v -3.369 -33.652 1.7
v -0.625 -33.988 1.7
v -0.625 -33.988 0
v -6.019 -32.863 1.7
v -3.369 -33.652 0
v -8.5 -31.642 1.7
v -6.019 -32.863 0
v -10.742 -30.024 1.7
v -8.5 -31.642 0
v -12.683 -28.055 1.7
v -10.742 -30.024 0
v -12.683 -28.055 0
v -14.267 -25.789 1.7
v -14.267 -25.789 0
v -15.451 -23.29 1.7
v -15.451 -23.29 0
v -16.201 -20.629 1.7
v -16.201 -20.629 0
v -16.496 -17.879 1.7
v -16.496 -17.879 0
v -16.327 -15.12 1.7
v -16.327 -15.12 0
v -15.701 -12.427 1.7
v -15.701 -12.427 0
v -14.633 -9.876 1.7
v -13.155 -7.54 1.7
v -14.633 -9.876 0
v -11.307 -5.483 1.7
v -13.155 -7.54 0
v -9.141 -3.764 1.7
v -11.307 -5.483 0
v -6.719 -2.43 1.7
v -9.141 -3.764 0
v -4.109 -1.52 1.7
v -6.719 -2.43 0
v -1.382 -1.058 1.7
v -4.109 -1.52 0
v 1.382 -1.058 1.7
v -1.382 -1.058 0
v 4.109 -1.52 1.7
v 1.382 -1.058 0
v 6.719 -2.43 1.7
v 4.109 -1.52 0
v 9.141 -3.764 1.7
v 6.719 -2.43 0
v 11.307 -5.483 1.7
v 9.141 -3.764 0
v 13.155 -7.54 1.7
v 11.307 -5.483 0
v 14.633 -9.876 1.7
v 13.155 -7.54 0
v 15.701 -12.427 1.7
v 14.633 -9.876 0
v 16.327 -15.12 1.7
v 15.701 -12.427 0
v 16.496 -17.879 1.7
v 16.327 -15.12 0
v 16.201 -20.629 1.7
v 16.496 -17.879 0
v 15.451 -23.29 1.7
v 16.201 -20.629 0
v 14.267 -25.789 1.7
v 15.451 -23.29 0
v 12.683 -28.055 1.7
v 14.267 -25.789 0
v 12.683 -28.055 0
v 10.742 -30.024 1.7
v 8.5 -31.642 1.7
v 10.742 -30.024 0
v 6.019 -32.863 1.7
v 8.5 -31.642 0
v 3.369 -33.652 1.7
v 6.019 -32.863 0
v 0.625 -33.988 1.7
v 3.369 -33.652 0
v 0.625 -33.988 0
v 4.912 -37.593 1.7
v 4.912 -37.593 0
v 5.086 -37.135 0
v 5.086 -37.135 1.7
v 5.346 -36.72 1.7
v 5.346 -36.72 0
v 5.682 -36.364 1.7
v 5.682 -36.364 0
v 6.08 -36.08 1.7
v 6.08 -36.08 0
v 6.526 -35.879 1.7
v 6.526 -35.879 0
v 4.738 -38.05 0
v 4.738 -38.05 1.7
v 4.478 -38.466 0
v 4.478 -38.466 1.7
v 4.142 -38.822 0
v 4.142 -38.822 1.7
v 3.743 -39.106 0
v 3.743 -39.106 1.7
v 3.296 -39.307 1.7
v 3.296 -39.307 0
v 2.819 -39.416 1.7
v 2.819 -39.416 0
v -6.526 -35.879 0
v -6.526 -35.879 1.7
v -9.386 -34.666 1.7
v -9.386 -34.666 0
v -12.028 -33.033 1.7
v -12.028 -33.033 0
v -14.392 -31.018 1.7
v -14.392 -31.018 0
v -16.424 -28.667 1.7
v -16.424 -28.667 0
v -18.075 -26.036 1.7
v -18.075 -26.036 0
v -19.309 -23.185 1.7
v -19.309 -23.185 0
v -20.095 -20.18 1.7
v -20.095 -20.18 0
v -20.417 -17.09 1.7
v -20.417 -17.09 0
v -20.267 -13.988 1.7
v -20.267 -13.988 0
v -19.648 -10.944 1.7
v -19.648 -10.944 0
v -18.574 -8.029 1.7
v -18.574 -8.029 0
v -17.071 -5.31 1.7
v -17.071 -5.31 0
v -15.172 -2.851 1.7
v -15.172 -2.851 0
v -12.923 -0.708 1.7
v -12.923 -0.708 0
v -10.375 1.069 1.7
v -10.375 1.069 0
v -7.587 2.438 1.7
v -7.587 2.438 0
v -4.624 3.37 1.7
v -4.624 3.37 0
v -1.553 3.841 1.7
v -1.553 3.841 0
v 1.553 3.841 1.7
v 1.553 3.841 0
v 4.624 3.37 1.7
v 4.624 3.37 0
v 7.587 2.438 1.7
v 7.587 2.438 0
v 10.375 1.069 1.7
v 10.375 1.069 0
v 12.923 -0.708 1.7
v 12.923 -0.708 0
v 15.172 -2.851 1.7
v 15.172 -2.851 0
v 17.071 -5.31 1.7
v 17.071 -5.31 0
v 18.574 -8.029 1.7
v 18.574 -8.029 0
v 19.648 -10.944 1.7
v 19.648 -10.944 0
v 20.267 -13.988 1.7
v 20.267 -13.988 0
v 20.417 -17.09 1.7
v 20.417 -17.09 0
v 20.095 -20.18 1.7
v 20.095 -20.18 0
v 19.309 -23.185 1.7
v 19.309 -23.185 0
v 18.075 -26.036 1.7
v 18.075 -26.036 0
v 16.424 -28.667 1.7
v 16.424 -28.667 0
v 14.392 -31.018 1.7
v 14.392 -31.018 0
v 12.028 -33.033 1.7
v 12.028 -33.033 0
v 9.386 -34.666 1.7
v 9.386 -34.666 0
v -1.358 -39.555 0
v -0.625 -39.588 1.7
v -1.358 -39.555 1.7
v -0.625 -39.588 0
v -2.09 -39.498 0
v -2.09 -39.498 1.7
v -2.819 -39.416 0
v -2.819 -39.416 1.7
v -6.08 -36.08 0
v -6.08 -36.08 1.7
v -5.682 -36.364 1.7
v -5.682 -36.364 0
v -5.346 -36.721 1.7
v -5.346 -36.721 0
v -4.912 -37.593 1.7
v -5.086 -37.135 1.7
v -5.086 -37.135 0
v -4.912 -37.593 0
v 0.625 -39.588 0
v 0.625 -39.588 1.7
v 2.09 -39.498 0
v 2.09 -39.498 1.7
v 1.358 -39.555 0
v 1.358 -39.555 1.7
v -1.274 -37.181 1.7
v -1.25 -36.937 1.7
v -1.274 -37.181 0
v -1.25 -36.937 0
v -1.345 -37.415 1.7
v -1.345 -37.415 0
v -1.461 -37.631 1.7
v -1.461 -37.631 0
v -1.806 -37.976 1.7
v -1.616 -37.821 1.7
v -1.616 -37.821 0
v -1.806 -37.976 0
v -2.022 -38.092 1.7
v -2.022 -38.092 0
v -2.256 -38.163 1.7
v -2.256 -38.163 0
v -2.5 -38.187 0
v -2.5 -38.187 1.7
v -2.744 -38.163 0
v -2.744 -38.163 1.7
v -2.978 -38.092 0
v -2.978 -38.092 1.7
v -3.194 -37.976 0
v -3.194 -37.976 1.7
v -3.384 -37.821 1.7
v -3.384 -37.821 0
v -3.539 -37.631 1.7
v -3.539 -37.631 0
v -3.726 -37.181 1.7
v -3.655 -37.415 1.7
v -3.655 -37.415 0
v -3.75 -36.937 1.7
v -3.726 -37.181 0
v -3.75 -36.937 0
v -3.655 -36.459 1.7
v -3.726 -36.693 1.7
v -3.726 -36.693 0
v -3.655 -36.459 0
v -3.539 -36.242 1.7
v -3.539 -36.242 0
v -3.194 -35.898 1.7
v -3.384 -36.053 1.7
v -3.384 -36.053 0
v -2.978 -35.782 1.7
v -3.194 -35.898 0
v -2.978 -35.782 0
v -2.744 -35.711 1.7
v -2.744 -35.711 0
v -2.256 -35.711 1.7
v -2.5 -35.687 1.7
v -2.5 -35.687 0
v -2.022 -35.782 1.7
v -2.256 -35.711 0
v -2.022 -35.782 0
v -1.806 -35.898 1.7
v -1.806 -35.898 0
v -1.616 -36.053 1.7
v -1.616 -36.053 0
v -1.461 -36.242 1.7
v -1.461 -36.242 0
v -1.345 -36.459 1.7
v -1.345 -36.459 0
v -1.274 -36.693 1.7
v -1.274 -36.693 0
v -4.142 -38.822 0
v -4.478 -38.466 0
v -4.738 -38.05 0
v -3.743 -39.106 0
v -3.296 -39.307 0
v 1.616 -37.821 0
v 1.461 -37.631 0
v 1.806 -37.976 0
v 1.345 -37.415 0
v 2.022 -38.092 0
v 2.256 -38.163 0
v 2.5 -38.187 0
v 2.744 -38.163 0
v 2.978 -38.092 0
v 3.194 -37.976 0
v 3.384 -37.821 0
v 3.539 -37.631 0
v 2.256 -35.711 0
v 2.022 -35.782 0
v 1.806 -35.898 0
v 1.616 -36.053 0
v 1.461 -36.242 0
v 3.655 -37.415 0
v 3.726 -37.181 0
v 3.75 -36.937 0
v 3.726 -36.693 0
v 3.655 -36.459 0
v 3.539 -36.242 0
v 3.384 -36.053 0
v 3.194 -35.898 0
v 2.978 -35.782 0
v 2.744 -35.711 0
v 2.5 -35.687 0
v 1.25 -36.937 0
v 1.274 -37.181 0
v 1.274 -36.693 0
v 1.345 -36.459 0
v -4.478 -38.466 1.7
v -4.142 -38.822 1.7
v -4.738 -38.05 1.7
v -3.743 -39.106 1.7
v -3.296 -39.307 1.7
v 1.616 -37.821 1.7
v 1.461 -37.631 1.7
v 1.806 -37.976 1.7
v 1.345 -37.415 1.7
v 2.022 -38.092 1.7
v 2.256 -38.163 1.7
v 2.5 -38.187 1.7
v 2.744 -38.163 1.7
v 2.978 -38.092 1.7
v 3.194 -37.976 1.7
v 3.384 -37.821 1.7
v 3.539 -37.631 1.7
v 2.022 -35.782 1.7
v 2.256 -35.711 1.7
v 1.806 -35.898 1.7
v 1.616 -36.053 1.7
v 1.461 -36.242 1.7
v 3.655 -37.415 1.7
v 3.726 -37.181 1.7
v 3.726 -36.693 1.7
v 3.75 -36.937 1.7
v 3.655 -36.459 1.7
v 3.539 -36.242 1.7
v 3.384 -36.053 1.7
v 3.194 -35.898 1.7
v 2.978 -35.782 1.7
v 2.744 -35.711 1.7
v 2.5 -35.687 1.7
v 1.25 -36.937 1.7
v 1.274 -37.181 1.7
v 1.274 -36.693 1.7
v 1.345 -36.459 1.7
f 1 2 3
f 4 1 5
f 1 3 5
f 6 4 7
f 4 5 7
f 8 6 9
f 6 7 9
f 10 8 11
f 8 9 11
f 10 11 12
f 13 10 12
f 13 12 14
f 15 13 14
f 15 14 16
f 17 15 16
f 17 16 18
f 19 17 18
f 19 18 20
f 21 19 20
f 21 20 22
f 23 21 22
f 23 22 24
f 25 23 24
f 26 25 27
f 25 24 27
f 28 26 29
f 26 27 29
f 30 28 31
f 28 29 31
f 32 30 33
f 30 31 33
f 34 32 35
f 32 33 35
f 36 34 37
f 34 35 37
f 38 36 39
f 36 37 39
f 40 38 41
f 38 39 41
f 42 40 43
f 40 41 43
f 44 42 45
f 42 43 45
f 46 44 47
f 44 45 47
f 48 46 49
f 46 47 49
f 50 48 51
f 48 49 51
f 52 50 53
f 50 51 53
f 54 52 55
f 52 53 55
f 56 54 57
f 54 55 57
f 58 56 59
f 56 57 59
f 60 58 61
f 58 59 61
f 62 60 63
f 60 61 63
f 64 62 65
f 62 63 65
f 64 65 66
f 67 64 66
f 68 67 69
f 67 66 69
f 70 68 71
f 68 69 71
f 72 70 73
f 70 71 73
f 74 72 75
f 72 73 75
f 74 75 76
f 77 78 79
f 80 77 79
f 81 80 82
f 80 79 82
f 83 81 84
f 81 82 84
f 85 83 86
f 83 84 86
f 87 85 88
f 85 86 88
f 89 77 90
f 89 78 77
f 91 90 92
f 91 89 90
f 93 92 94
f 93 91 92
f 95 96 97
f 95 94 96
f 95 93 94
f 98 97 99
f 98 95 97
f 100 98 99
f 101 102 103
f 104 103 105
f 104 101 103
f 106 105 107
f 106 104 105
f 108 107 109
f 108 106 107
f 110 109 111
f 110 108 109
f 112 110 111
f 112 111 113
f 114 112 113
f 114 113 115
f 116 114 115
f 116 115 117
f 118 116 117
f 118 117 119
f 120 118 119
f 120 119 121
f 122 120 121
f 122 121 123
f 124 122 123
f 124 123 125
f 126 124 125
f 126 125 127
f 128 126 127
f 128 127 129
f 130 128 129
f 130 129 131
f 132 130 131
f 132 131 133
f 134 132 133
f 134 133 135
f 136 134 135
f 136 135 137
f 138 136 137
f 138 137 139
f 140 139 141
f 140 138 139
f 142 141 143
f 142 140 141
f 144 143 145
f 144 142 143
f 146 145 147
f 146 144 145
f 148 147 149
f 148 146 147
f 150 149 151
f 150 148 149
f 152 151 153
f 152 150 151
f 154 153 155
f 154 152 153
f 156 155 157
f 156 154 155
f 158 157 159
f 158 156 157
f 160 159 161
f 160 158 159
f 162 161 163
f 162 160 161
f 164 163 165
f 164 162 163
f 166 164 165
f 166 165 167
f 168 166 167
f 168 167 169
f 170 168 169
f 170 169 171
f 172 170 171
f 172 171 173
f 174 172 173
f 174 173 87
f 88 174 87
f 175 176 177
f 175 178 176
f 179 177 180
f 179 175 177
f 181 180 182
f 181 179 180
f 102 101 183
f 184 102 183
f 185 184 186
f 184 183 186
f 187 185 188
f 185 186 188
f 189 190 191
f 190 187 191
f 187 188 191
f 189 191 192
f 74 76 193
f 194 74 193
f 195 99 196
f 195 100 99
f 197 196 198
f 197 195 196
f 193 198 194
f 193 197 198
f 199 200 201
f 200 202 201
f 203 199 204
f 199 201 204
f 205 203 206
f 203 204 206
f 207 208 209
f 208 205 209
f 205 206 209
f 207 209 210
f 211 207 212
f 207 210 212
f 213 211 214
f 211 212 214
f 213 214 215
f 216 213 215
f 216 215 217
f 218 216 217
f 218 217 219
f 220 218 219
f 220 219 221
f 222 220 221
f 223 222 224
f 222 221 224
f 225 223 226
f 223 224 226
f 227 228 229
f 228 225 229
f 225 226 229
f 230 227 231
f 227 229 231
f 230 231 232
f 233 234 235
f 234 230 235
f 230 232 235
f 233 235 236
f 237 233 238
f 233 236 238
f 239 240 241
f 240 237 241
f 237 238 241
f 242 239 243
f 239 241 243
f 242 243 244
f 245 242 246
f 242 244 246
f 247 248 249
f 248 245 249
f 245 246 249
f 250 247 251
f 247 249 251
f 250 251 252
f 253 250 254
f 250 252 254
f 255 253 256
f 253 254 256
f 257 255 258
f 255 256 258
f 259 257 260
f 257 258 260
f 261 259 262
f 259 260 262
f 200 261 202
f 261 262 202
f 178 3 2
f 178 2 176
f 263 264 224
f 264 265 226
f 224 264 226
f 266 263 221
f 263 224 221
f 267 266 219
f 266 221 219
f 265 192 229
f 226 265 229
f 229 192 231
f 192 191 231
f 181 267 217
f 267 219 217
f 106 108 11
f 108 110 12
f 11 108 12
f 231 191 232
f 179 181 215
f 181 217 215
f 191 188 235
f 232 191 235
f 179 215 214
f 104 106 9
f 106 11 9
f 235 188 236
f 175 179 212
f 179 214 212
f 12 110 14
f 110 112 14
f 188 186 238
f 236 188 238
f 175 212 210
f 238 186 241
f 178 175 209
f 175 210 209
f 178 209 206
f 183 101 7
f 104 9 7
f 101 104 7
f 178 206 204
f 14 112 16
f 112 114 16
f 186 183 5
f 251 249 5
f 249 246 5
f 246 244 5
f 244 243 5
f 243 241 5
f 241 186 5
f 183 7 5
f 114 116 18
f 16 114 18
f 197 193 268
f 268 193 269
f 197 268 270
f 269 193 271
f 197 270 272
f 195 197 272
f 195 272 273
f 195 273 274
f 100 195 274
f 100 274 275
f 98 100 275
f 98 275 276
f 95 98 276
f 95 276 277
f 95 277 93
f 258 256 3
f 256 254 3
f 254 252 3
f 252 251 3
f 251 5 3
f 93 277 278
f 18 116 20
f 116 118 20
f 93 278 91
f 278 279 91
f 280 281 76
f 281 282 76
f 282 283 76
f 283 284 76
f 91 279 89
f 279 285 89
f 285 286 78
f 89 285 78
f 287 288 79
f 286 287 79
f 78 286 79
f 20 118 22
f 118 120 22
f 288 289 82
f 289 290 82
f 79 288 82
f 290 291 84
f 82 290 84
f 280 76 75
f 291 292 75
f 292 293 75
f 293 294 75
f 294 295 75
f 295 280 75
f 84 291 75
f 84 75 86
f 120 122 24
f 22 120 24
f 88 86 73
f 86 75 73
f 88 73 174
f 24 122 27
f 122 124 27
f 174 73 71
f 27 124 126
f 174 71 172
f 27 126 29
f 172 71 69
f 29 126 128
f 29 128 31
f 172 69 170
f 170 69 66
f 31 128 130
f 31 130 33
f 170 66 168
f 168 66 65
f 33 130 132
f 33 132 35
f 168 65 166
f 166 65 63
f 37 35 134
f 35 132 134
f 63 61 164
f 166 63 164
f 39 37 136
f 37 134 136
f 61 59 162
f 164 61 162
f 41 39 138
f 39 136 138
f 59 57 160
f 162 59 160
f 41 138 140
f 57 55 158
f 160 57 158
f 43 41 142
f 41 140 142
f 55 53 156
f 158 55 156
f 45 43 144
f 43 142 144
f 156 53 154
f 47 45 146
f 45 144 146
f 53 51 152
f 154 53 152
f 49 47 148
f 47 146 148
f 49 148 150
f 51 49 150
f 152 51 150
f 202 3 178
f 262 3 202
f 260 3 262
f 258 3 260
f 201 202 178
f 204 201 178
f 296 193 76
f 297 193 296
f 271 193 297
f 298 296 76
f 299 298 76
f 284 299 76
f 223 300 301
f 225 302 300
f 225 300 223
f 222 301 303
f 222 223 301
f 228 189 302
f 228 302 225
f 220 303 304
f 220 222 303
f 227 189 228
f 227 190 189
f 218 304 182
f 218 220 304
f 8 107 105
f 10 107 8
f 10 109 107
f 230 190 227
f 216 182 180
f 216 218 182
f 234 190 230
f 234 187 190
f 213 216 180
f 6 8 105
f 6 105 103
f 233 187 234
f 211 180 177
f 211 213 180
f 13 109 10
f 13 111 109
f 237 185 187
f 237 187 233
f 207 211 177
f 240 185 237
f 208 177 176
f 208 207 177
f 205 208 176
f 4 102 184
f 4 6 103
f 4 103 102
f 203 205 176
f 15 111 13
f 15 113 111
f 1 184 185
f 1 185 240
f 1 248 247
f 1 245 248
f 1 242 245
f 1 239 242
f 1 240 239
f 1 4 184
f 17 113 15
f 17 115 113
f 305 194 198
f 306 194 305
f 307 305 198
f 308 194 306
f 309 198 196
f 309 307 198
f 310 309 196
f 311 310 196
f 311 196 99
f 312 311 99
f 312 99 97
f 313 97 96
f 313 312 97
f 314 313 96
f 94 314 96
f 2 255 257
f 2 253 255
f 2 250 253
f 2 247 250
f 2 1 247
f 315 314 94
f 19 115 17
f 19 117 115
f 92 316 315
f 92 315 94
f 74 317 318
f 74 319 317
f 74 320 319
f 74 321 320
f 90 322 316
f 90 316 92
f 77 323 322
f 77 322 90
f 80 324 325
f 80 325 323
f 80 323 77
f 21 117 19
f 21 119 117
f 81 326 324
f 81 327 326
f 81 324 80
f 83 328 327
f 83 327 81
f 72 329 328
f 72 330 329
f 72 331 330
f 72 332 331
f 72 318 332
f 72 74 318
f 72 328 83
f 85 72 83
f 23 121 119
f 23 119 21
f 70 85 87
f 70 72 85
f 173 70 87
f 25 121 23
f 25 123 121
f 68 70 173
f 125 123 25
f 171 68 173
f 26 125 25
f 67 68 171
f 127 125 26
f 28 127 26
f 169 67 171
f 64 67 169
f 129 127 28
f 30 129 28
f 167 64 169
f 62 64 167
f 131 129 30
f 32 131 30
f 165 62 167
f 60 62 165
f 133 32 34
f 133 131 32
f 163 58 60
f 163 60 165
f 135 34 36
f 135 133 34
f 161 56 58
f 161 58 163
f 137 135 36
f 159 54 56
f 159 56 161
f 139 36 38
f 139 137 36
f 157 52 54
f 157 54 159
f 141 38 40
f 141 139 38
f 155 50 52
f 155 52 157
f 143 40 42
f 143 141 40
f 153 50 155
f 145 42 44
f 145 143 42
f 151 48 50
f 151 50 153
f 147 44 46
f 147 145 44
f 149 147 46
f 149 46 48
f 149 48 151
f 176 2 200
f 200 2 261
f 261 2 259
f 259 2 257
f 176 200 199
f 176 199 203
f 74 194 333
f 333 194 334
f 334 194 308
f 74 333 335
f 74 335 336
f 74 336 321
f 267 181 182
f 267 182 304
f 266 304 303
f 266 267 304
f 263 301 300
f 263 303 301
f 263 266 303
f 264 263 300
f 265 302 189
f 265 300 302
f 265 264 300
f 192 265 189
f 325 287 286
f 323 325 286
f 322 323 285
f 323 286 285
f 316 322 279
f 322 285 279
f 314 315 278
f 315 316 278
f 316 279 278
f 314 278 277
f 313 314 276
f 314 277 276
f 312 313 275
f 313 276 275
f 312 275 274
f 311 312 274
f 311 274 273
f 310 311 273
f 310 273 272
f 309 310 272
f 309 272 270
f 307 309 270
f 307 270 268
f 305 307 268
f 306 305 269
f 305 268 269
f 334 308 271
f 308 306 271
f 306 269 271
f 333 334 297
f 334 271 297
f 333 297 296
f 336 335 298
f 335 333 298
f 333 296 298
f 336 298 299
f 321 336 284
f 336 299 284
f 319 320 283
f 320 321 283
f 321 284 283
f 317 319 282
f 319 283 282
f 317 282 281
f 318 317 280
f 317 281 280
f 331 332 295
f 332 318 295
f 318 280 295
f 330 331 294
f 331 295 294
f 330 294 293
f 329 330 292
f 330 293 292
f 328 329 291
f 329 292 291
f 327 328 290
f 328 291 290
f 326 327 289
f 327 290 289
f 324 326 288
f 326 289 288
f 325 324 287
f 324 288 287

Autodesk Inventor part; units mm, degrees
ref_plane "YZ Plane" through (0, 0, 0) normal (1, 0, 0) x (0, 1, 0)
ref_plane "XZ Plane" through (0, 0, 0) normal (0, 1, 0) x (-1, 0, 0)
sketch "Эскиз1" plane through (0, 0, 0) normal (0, 0, 1) x (1, 0, 0)
  line L0 (-6, 0) -> (6, 0) construction
  arc A0 (0.625, -33.9882) -> (-0.625, -33.9882) centre (0, -17.5) ccw
  line L1 (0, 20.1894) -> (0, -80.5364) projected
  line L2 (-48.09, 0) -> (48.09, 0) projected
  line L3 (-0.625, -33.9882) -> (-0.625, -39.5882)
  line L4 (-0.625, -6.5402) -> (-0.625, -13.29) construction
  line L5 (-2.7947, 3.9) -> (3.6722, 3.9) construction
  arc A1 (6.5262, -35.8793) -> (-6.5262, -35.8793) centre (0, -16.525) ccw
  arc A2 (-2.8189, -39.4165) -> (-0.625, -39.5882) centre (0, -17.5) ccw
  arc A3 (-4.9125, -37.5926) -> (-2.8189, -39.4165) centre (-2.5, -36.9369) ccw
  arc A4 (-4.9125, -37.5926) -> (-6.5262, -35.8793) centre (-7.325, -38.2483) ccw
  line L6 (0.625, -33.9882) -> (0.625, -39.5882)
  line L7 (0.625, -6.5402) -> (0.625, -13.29) construction
  arc A5 (0.625, -39.5882) -> (2.8189, -39.4165) centre (0, -17.5) ccw
  arc A6 (2.8189, -39.4165) -> (4.9125, -37.5926) centre (2.5, -36.9369) ccw
  arc A7 (6.5262, -35.8793) -> (4.9125, -37.5926) centre (7.325, -38.2483) ccw
  circle A8 centre (-2.5, -36.9369) radius 1.25
  circle A9 centre (2.5, -36.9369) radius 1.25
  dimension "d0" = 33
  dimension "d1" = 5.6
  dimension "d6" = 0.625
  dimension "d7" = 3.9
  dimension "d8" = 0.975
  dimension "d9" = 2.5
  dimension "d10" = 2.5
  dimension "d11" = 1.875
  dimension "d12" = 2.5
  dimension "d13" = 2.5
  dimension "d14" = 17.5
extrude "Базовый элемент" add sketch "Эскиз1" along normal blind 1.7
ref_plane "Work Plane1" through (0, -17.5, 0) normal (1, 0, 0) x (0, 0, 1)
equation "\"d0\" = ND"
equation "\"d1\" = SRB2"
equation "\"d6\" = 0.25 * SD5"
equation "\"d7\" = SRB1"
equation "\"d8\" = 0.25 * SRB1"
equation "\"d9\" = SD5"
equation "\"d10\" = SD5"
equation "\"d11\" = 0.75 * SD5"
equation "\"d12\" = SD5"
equation "\"d13\" = SD5"
equation "\"d14\" = 0.5 * WD"
equation "\"d2\" = SD"
equation "\"WD\" = WDMIN"
equation "\"SD\" = 1.7"
equation "\"SRB1\" = 3.9"
equation "\"ND\" = 33"
equation "\"SRB2\" = 5.6"
equation "\"SD5\" = 2.5"
equation "\"WDMIN\" = 35"
equation "\"SD3\" = 32.2"
equation "\"WDMAX\" = 36"
equation "\"SNB\" = 1.9"
equation "\"BUBRMI\" = 3"
properties part number "Кольцо A35 ГОСТ 13942-86" material "Сталь, мягкая"
